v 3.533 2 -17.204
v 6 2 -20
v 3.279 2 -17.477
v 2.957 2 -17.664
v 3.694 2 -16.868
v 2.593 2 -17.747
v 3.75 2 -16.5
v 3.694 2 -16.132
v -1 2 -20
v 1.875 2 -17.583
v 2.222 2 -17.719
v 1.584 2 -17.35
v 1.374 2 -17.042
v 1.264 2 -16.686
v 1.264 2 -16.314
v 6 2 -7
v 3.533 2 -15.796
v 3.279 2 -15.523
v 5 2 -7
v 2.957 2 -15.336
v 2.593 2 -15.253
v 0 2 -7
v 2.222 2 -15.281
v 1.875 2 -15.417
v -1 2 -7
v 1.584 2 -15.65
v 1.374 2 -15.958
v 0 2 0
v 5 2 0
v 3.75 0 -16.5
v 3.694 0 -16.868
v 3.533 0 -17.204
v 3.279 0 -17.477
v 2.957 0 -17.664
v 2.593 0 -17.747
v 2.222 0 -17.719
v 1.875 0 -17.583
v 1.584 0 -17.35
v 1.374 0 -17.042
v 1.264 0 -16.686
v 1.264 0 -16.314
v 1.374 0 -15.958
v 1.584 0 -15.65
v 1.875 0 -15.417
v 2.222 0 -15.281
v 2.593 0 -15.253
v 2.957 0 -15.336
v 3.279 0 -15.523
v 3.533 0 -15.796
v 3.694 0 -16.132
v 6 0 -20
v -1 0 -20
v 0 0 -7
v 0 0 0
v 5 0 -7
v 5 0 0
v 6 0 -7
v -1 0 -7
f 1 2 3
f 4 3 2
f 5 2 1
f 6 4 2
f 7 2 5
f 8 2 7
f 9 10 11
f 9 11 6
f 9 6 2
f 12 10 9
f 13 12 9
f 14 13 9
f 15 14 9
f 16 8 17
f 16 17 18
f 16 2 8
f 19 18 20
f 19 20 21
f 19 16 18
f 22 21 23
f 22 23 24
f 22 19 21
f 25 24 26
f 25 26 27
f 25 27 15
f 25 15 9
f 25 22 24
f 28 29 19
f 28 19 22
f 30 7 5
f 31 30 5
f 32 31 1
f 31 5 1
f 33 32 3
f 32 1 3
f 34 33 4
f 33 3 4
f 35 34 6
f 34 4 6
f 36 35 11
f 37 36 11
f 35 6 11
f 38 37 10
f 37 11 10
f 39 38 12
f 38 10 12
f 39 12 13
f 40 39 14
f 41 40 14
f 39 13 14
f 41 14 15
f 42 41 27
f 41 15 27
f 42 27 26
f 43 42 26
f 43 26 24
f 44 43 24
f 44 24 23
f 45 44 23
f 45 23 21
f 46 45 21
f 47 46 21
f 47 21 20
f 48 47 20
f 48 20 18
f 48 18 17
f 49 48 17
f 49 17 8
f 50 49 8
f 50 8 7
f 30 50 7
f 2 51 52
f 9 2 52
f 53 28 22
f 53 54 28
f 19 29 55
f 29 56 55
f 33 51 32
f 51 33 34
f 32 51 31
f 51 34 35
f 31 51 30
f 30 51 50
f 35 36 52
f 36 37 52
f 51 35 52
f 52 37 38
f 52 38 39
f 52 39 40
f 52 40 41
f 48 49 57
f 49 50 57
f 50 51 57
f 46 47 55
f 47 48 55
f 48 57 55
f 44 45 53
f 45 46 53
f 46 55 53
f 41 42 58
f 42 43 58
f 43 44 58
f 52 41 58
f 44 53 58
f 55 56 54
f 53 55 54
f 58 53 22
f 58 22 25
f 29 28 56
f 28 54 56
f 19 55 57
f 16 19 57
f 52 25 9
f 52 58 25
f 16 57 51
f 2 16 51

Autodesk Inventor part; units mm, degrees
ref_plane "YZ Plane" through (0, 0, 0) normal (1, 0, 0) x (0, 1, 0)
ref_plane "XZ Plane" through (0, 0, 0) normal (0, 1, 0) x (-1, 0, 0)
ref_plane "XY Plane" through (0, 0, 0) normal (0, 0, 1) x (1, 0, 0)
sketch "Sketch3" plane through (0, 0, 0) normal (0, 1, 0) x (-1, 0, 0)
  line L0 (0, 0) -> (-5, 0)
  line L1 (-5, 0) -> (-5, -7)
  line L2 (0, 0) -> (0, -7)
  line L3 (0, -7) -> (1, -7)
  line L4 (1, -7) -> (1, -20)
  line L5 (-5, -7) -> (-6, -7)
  line L6 (-6, -7) -> (-6, -20)
  line L7 (-6, -20) -> (1, -20)
  dimension "d9" = 5
  dimension "d10" = 7
  dimension "d11" = 1
  dimension "d12" = 13
  dimension "d13" = 1
extrude "Extrusion3" add sketch "Sketch3" along normal blind 2
sketch "Sketch4" plane through (0, 2, 0) normal (0, 1, 0) x (1, 0, 0)
  line L0 (-1, 20) -> (-1, 7) projected
  line L1 (-1, 20) -> (2.5, 20)
  line L2 (6, 20) -> (-1, 20) projected
  line L3 (2.5, 20) -> (2.5, 16.5)
  circle A0 centre (2.5, 16.5) radius 1.25
  point P0 (0, 0)
  dimension "d16" = 3.5
  dimension "d17" = 3.5
  dimension "d18" = 2.5
extrude "Extrusion4" cut sketch "Sketch4" against normal blind 2
properties part number "HINGE B"
